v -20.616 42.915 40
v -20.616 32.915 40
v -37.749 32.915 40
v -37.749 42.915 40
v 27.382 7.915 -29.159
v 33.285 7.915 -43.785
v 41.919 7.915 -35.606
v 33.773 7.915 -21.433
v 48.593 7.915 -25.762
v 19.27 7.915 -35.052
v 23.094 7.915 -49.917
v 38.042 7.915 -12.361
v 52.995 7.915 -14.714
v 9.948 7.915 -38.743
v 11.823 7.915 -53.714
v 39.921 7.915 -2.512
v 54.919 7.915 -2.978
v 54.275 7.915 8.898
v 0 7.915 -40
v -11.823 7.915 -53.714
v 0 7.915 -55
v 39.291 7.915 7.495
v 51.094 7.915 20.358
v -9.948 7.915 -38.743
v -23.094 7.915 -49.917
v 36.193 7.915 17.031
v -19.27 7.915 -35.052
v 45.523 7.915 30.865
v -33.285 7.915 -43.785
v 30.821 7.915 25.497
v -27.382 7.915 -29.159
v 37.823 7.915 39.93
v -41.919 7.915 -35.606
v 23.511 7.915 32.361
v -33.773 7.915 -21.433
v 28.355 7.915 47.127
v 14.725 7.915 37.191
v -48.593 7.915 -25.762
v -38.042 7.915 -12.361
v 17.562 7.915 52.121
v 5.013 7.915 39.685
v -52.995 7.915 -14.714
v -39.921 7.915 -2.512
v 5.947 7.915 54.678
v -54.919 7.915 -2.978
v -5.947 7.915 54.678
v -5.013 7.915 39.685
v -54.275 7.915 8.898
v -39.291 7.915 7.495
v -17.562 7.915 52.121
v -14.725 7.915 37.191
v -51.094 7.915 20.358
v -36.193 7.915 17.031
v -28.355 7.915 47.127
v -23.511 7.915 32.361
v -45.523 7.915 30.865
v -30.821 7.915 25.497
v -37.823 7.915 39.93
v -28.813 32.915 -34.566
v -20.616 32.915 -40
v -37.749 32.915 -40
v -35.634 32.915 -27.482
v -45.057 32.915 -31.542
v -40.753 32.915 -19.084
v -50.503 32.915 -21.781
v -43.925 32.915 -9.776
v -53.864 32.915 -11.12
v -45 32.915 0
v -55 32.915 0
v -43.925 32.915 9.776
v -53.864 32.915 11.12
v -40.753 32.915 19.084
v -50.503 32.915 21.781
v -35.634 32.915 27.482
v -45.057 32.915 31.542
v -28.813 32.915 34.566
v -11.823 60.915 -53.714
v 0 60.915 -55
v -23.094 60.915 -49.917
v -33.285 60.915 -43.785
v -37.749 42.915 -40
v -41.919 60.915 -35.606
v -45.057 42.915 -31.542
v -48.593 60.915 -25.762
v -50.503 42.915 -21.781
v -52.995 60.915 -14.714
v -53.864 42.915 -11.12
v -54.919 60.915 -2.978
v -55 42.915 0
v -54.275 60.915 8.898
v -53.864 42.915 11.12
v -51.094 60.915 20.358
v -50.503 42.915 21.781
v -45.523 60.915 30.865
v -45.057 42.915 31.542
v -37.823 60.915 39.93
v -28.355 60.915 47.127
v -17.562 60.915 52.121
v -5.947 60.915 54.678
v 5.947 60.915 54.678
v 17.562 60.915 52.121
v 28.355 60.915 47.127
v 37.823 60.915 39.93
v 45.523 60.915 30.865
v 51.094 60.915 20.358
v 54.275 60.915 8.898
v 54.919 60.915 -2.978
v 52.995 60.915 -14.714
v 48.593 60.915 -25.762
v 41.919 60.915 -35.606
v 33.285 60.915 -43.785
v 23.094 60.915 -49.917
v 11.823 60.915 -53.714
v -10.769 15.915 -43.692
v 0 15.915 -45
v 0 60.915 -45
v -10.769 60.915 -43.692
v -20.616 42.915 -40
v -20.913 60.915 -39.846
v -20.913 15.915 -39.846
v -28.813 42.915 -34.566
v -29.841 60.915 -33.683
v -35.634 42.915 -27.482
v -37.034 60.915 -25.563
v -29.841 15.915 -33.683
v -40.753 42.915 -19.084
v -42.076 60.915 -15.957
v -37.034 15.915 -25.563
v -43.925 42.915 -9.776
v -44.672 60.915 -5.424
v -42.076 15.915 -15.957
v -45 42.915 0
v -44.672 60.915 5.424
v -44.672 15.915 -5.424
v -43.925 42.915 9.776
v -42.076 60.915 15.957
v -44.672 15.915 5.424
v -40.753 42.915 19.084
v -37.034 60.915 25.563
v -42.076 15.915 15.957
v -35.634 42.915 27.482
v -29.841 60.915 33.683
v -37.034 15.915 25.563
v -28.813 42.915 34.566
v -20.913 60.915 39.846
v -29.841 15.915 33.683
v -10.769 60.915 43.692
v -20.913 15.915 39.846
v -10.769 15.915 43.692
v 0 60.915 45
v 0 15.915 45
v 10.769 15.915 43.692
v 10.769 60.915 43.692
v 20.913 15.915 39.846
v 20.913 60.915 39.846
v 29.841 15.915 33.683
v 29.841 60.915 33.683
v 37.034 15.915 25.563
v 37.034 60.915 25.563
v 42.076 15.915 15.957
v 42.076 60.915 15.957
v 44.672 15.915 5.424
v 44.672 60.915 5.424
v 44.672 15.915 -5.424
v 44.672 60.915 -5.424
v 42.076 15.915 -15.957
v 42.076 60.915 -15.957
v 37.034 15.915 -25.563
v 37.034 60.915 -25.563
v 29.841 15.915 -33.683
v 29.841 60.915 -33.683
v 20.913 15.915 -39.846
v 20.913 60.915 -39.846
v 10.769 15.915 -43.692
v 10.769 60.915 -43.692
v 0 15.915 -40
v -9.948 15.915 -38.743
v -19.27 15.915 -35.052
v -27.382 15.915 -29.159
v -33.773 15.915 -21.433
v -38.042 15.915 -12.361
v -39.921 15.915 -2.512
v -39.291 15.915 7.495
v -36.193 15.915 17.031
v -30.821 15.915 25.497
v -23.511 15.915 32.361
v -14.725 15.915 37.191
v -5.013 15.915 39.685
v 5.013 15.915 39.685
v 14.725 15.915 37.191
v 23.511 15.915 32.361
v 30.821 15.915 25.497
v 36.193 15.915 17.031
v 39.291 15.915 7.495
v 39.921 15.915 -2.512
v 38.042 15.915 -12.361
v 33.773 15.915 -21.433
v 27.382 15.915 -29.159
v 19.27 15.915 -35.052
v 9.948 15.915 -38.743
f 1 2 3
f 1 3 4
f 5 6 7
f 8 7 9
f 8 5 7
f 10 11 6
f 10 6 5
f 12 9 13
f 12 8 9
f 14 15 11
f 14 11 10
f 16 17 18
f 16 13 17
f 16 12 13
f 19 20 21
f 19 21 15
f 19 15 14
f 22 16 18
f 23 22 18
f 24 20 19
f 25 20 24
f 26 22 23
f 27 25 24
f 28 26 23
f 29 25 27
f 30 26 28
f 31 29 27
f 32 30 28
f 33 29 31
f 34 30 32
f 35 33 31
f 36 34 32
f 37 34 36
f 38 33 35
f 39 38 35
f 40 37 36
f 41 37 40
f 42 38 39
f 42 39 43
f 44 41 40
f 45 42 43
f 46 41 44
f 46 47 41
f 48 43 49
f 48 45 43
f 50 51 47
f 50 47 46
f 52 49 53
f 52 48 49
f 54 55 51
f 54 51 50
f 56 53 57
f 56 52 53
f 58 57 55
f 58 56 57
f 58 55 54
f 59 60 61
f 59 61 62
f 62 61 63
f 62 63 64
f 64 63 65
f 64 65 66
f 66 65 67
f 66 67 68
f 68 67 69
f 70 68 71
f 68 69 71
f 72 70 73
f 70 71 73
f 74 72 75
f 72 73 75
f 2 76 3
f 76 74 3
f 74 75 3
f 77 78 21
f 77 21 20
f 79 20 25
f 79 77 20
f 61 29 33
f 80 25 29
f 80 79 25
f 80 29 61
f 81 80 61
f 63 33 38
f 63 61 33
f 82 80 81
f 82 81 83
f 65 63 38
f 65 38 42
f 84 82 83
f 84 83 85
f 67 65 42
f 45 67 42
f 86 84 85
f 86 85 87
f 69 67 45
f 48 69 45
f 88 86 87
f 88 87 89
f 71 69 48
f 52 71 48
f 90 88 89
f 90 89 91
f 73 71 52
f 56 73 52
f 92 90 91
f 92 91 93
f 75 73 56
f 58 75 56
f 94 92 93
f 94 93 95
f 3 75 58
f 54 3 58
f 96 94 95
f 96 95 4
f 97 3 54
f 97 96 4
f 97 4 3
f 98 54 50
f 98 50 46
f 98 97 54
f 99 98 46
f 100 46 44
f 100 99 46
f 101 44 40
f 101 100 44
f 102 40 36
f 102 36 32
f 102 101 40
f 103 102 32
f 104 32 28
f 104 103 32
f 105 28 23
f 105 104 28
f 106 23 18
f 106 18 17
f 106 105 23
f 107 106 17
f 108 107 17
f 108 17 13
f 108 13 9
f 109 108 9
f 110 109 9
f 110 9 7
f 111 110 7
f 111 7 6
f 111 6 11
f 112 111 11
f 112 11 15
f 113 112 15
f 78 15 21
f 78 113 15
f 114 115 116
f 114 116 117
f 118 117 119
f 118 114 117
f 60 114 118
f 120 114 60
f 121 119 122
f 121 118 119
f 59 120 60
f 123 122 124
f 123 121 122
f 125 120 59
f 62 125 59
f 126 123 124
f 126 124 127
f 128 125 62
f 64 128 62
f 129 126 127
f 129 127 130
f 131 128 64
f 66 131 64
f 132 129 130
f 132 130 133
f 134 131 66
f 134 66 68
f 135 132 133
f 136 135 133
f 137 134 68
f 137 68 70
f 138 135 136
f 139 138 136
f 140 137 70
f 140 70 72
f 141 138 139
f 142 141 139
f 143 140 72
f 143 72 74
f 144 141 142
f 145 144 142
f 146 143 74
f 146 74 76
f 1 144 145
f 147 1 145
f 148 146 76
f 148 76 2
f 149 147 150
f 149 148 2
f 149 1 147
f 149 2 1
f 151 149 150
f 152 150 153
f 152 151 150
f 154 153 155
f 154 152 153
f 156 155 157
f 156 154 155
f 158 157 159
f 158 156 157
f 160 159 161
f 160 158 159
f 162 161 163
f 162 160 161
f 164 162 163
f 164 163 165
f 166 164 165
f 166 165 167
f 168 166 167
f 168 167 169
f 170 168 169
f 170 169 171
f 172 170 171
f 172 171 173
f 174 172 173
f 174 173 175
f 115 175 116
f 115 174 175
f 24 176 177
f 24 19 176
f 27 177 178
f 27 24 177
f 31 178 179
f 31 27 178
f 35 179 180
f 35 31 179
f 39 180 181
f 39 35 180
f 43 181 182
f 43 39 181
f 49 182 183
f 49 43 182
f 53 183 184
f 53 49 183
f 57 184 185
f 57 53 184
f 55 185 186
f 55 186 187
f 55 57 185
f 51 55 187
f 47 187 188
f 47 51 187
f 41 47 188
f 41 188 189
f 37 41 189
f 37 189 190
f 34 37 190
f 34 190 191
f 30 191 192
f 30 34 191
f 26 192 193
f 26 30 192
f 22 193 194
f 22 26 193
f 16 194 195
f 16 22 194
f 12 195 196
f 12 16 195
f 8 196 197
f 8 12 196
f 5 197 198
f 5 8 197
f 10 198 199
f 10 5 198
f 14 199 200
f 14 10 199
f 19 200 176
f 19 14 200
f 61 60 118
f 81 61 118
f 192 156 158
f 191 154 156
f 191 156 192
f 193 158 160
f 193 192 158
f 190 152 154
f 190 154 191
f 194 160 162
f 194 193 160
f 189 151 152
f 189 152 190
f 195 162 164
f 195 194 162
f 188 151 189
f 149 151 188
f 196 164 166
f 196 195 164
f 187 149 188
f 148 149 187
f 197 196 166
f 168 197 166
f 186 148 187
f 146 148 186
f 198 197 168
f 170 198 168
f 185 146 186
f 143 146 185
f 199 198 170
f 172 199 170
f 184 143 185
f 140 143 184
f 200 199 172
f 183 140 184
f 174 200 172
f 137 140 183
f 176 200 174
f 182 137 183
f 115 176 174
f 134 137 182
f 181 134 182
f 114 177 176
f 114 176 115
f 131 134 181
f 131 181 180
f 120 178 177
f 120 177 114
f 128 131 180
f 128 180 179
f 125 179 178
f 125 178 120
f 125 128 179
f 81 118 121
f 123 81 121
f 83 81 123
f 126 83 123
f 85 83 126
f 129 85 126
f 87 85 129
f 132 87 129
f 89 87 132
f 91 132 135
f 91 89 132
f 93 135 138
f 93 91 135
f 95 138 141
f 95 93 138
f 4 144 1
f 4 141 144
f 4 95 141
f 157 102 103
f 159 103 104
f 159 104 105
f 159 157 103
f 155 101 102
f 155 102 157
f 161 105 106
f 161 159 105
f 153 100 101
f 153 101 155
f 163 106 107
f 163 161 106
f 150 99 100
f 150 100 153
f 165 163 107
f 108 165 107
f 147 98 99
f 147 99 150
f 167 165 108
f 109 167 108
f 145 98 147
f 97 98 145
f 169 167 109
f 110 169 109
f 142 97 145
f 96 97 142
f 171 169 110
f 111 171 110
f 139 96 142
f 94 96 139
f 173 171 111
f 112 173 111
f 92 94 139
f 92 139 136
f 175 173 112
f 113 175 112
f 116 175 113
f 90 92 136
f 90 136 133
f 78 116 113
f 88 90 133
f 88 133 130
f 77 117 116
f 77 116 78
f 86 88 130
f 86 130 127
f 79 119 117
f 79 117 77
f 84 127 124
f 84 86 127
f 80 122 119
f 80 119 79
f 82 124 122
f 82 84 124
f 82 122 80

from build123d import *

# Parameters (mm, degrees)
SKETCH2_W          = 80
SKETCH2_H          = 10
CUT_EXTRUDE1_DEPTH = 39


with BuildPart() as part:
    # Sketch1 → Revolve1 (revolve)
    with BuildSketch(Plane.XY):
        Polygon((40, 7.915215599), (55, 7.915215599), (55, 60.915215599), (45, 60.915215599), (45, 15.915215599), (40, 15.915215599), align=None)
    revolve(axis=Axis((0, 0, 0), (0, 1, 0)))

    # Sketch2 → Cut-Extrude1 (cut)
    with BuildSketch(Plane.ZY.offset(55)):
        with Locations((0, 37.915215599)):
            Rectangle(SKETCH2_W, SKETCH2_H)
    extrude(amount=-CUT_EXTRUDE1_DEPTH, mode=Mode.SUBTRACT)


solid = part.part
